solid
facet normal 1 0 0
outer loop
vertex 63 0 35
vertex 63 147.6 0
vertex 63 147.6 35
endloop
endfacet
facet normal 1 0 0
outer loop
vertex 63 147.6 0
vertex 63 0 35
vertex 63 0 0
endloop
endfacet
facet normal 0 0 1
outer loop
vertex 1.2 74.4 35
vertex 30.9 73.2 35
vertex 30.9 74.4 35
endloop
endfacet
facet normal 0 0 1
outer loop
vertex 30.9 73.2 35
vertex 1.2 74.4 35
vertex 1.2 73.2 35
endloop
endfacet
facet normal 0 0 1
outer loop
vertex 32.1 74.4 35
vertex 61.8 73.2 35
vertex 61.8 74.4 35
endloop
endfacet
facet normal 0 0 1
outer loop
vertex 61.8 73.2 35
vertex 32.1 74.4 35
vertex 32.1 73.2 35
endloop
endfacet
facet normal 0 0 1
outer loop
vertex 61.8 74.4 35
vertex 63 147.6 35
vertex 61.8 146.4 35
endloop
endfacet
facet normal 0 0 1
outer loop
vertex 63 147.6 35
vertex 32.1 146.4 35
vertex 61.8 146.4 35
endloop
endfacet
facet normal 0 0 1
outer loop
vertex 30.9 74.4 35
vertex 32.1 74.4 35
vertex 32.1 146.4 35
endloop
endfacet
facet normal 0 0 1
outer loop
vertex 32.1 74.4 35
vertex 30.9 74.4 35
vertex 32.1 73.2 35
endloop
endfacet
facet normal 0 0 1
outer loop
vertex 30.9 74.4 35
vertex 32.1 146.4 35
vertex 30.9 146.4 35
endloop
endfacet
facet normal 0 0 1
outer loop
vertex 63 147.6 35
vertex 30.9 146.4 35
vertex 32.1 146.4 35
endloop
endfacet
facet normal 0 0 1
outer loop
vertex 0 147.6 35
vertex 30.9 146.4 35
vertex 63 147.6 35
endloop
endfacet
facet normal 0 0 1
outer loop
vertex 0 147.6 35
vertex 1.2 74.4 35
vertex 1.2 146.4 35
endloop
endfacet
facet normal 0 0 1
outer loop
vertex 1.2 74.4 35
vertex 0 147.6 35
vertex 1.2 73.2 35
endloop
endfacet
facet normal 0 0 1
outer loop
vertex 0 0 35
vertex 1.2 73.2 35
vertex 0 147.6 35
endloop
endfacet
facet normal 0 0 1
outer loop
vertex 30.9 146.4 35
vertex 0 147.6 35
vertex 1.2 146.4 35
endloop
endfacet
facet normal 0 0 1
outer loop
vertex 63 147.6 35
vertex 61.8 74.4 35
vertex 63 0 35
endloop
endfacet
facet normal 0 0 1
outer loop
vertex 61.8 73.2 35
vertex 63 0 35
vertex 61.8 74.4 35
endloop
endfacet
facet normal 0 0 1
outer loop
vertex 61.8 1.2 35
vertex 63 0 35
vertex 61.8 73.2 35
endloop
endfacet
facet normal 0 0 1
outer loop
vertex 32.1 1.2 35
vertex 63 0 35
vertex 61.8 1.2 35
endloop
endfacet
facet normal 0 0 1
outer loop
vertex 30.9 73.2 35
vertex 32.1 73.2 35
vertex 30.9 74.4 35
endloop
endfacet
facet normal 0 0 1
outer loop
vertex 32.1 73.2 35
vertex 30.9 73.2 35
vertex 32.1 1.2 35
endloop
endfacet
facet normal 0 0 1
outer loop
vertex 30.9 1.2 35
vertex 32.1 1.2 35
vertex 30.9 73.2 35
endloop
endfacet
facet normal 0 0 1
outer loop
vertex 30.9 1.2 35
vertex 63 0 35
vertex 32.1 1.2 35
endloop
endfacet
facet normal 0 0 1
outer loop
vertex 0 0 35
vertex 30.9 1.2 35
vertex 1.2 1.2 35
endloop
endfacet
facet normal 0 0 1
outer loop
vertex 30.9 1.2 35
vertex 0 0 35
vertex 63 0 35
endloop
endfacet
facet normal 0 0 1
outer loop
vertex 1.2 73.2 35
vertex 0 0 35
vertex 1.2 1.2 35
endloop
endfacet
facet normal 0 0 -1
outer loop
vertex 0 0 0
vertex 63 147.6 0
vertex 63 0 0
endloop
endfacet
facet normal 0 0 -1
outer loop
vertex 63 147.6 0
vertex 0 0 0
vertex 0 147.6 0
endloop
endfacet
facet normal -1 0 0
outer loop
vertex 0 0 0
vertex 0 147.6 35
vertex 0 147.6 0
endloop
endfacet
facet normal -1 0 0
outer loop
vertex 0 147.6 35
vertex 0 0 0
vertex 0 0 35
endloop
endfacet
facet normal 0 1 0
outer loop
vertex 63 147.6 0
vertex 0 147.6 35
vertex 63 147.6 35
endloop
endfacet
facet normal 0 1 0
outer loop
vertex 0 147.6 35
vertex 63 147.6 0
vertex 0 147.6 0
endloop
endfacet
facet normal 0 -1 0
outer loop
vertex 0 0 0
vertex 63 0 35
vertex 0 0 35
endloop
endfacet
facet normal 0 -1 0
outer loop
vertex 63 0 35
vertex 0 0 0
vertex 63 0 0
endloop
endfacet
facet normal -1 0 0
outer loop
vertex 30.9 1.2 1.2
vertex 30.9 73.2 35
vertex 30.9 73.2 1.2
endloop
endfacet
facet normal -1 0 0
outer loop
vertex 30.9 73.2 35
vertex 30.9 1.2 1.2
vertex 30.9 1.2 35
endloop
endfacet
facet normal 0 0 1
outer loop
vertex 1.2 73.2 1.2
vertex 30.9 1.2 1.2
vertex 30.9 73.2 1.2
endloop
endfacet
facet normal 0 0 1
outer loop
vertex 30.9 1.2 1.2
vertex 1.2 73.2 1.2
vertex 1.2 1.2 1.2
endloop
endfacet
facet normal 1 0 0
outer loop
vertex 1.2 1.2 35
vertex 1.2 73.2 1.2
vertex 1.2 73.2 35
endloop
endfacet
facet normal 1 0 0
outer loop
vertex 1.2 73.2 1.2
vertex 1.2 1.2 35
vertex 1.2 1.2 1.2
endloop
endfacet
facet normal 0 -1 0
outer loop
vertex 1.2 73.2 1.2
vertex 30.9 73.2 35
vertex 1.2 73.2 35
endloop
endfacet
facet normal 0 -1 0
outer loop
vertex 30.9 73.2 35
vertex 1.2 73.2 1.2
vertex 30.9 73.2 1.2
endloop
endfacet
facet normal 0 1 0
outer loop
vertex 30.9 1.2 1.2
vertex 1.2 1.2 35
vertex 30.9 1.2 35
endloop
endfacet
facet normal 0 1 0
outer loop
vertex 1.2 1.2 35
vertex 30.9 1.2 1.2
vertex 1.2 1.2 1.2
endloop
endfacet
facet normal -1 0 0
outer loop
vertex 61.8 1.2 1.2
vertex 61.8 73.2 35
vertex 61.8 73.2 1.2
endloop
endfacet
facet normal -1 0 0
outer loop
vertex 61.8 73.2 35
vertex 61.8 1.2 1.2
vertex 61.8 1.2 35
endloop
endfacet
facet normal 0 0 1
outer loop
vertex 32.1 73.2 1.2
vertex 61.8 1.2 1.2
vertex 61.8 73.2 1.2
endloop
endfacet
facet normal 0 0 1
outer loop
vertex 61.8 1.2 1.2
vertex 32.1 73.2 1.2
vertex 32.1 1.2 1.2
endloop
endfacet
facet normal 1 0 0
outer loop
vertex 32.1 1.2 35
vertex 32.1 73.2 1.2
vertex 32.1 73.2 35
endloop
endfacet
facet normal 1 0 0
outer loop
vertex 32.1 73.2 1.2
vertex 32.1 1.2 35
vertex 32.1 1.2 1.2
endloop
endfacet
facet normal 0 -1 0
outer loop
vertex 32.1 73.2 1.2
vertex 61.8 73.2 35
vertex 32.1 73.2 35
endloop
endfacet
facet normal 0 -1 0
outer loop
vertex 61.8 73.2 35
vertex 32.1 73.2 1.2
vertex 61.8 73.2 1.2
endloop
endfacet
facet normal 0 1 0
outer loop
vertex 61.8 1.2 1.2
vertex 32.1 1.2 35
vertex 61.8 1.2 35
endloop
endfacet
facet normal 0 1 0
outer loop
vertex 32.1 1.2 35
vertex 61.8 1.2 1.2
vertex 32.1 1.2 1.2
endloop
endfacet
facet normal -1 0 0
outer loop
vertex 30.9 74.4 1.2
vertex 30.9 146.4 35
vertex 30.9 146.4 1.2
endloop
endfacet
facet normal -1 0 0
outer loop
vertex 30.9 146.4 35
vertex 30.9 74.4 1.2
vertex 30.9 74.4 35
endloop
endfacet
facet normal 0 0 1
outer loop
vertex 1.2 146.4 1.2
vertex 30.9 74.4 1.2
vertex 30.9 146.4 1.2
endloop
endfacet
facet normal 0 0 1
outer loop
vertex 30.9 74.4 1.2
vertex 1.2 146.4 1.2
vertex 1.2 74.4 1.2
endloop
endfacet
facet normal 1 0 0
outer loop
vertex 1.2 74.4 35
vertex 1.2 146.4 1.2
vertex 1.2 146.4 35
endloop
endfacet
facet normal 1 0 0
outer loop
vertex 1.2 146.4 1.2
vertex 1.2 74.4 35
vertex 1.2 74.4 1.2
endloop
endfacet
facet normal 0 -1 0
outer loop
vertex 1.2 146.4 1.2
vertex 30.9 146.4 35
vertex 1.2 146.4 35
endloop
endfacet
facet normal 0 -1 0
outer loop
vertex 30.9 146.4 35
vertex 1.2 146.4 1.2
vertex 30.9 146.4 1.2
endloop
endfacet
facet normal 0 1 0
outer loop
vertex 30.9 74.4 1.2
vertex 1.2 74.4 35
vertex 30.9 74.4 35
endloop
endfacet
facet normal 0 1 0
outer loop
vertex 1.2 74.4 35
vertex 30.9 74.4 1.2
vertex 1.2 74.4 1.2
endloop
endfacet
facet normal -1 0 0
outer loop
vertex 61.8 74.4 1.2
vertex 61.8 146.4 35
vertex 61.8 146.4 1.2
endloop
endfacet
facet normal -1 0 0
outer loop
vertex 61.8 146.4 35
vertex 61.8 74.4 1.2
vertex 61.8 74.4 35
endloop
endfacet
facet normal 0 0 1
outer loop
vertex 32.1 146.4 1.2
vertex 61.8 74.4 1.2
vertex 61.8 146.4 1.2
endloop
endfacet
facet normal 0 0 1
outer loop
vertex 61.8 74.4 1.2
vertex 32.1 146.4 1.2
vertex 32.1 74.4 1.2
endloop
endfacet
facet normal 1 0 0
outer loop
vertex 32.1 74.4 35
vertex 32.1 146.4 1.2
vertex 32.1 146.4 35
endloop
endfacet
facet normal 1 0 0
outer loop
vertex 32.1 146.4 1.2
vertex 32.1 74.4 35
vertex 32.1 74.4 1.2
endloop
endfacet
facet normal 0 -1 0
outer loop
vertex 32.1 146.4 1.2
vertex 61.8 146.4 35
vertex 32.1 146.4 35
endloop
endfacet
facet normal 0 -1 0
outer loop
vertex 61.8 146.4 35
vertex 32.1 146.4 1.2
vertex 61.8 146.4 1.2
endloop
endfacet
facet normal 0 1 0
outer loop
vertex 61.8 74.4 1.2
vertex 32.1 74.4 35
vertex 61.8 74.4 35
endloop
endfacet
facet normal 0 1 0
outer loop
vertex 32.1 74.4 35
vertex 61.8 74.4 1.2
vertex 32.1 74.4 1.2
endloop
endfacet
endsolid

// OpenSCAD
// file: notch.scad
/**
a notch is a trapezoidal prism which will be "subtracted"
from a wall to create an opening

parameters:

top: how wide the top of the trapezoid is
bottom: how wide the bottom of the trapezoid is
tall: how tall the wall is
thich: how thick the wall is

the notch will be created with the botto
*/

module notch(top, bottom, tall, thick) {
		x = 0.5 * (bottom-top);
		// translate to make the bottom start at 0,0
		translate([0, thick, 0]) {
				// rotate because linear extrude extrudes along the
				// z axis and we want it along the y axis
				rotate([90,0,0]) {
						linear_extrude(height=thick) {
								polygon(points=[[0,0], [bottom,0], [bottom-x,tall], [x,tall]]);
						}
				}
		}


}
// main file
wall = 1.2;
use <notch.scad>;

module resources() {
		difference() {

				// 193 - 1 - (42 + 2*wall)
				cube([63, 193 - 1 - 42 - wall - wall, 35]);
				// (63 - 3*wall) / 2 = 29.7 (/2 for 2 chambers)
				// (150 - 3*wall) / 2 = 73.2 (/2 for 2 chambers)
				translate([wall, wall, wall]) {
						cube([29.7, 72, 34]);
				}
				translate([wall + wall +  29.7, wall, wall]) {
						cube([29.7, 72, 34]);
				}
				translate([wall, wall + wall + 72, wall]) {
						cube([29.7, 72, 34]);
				}
				translate([wall + wall +  29.7, wall + wall + 72, wall]) {
						cube([29.7, 72, 34]);
				}


		}
}

resources();
